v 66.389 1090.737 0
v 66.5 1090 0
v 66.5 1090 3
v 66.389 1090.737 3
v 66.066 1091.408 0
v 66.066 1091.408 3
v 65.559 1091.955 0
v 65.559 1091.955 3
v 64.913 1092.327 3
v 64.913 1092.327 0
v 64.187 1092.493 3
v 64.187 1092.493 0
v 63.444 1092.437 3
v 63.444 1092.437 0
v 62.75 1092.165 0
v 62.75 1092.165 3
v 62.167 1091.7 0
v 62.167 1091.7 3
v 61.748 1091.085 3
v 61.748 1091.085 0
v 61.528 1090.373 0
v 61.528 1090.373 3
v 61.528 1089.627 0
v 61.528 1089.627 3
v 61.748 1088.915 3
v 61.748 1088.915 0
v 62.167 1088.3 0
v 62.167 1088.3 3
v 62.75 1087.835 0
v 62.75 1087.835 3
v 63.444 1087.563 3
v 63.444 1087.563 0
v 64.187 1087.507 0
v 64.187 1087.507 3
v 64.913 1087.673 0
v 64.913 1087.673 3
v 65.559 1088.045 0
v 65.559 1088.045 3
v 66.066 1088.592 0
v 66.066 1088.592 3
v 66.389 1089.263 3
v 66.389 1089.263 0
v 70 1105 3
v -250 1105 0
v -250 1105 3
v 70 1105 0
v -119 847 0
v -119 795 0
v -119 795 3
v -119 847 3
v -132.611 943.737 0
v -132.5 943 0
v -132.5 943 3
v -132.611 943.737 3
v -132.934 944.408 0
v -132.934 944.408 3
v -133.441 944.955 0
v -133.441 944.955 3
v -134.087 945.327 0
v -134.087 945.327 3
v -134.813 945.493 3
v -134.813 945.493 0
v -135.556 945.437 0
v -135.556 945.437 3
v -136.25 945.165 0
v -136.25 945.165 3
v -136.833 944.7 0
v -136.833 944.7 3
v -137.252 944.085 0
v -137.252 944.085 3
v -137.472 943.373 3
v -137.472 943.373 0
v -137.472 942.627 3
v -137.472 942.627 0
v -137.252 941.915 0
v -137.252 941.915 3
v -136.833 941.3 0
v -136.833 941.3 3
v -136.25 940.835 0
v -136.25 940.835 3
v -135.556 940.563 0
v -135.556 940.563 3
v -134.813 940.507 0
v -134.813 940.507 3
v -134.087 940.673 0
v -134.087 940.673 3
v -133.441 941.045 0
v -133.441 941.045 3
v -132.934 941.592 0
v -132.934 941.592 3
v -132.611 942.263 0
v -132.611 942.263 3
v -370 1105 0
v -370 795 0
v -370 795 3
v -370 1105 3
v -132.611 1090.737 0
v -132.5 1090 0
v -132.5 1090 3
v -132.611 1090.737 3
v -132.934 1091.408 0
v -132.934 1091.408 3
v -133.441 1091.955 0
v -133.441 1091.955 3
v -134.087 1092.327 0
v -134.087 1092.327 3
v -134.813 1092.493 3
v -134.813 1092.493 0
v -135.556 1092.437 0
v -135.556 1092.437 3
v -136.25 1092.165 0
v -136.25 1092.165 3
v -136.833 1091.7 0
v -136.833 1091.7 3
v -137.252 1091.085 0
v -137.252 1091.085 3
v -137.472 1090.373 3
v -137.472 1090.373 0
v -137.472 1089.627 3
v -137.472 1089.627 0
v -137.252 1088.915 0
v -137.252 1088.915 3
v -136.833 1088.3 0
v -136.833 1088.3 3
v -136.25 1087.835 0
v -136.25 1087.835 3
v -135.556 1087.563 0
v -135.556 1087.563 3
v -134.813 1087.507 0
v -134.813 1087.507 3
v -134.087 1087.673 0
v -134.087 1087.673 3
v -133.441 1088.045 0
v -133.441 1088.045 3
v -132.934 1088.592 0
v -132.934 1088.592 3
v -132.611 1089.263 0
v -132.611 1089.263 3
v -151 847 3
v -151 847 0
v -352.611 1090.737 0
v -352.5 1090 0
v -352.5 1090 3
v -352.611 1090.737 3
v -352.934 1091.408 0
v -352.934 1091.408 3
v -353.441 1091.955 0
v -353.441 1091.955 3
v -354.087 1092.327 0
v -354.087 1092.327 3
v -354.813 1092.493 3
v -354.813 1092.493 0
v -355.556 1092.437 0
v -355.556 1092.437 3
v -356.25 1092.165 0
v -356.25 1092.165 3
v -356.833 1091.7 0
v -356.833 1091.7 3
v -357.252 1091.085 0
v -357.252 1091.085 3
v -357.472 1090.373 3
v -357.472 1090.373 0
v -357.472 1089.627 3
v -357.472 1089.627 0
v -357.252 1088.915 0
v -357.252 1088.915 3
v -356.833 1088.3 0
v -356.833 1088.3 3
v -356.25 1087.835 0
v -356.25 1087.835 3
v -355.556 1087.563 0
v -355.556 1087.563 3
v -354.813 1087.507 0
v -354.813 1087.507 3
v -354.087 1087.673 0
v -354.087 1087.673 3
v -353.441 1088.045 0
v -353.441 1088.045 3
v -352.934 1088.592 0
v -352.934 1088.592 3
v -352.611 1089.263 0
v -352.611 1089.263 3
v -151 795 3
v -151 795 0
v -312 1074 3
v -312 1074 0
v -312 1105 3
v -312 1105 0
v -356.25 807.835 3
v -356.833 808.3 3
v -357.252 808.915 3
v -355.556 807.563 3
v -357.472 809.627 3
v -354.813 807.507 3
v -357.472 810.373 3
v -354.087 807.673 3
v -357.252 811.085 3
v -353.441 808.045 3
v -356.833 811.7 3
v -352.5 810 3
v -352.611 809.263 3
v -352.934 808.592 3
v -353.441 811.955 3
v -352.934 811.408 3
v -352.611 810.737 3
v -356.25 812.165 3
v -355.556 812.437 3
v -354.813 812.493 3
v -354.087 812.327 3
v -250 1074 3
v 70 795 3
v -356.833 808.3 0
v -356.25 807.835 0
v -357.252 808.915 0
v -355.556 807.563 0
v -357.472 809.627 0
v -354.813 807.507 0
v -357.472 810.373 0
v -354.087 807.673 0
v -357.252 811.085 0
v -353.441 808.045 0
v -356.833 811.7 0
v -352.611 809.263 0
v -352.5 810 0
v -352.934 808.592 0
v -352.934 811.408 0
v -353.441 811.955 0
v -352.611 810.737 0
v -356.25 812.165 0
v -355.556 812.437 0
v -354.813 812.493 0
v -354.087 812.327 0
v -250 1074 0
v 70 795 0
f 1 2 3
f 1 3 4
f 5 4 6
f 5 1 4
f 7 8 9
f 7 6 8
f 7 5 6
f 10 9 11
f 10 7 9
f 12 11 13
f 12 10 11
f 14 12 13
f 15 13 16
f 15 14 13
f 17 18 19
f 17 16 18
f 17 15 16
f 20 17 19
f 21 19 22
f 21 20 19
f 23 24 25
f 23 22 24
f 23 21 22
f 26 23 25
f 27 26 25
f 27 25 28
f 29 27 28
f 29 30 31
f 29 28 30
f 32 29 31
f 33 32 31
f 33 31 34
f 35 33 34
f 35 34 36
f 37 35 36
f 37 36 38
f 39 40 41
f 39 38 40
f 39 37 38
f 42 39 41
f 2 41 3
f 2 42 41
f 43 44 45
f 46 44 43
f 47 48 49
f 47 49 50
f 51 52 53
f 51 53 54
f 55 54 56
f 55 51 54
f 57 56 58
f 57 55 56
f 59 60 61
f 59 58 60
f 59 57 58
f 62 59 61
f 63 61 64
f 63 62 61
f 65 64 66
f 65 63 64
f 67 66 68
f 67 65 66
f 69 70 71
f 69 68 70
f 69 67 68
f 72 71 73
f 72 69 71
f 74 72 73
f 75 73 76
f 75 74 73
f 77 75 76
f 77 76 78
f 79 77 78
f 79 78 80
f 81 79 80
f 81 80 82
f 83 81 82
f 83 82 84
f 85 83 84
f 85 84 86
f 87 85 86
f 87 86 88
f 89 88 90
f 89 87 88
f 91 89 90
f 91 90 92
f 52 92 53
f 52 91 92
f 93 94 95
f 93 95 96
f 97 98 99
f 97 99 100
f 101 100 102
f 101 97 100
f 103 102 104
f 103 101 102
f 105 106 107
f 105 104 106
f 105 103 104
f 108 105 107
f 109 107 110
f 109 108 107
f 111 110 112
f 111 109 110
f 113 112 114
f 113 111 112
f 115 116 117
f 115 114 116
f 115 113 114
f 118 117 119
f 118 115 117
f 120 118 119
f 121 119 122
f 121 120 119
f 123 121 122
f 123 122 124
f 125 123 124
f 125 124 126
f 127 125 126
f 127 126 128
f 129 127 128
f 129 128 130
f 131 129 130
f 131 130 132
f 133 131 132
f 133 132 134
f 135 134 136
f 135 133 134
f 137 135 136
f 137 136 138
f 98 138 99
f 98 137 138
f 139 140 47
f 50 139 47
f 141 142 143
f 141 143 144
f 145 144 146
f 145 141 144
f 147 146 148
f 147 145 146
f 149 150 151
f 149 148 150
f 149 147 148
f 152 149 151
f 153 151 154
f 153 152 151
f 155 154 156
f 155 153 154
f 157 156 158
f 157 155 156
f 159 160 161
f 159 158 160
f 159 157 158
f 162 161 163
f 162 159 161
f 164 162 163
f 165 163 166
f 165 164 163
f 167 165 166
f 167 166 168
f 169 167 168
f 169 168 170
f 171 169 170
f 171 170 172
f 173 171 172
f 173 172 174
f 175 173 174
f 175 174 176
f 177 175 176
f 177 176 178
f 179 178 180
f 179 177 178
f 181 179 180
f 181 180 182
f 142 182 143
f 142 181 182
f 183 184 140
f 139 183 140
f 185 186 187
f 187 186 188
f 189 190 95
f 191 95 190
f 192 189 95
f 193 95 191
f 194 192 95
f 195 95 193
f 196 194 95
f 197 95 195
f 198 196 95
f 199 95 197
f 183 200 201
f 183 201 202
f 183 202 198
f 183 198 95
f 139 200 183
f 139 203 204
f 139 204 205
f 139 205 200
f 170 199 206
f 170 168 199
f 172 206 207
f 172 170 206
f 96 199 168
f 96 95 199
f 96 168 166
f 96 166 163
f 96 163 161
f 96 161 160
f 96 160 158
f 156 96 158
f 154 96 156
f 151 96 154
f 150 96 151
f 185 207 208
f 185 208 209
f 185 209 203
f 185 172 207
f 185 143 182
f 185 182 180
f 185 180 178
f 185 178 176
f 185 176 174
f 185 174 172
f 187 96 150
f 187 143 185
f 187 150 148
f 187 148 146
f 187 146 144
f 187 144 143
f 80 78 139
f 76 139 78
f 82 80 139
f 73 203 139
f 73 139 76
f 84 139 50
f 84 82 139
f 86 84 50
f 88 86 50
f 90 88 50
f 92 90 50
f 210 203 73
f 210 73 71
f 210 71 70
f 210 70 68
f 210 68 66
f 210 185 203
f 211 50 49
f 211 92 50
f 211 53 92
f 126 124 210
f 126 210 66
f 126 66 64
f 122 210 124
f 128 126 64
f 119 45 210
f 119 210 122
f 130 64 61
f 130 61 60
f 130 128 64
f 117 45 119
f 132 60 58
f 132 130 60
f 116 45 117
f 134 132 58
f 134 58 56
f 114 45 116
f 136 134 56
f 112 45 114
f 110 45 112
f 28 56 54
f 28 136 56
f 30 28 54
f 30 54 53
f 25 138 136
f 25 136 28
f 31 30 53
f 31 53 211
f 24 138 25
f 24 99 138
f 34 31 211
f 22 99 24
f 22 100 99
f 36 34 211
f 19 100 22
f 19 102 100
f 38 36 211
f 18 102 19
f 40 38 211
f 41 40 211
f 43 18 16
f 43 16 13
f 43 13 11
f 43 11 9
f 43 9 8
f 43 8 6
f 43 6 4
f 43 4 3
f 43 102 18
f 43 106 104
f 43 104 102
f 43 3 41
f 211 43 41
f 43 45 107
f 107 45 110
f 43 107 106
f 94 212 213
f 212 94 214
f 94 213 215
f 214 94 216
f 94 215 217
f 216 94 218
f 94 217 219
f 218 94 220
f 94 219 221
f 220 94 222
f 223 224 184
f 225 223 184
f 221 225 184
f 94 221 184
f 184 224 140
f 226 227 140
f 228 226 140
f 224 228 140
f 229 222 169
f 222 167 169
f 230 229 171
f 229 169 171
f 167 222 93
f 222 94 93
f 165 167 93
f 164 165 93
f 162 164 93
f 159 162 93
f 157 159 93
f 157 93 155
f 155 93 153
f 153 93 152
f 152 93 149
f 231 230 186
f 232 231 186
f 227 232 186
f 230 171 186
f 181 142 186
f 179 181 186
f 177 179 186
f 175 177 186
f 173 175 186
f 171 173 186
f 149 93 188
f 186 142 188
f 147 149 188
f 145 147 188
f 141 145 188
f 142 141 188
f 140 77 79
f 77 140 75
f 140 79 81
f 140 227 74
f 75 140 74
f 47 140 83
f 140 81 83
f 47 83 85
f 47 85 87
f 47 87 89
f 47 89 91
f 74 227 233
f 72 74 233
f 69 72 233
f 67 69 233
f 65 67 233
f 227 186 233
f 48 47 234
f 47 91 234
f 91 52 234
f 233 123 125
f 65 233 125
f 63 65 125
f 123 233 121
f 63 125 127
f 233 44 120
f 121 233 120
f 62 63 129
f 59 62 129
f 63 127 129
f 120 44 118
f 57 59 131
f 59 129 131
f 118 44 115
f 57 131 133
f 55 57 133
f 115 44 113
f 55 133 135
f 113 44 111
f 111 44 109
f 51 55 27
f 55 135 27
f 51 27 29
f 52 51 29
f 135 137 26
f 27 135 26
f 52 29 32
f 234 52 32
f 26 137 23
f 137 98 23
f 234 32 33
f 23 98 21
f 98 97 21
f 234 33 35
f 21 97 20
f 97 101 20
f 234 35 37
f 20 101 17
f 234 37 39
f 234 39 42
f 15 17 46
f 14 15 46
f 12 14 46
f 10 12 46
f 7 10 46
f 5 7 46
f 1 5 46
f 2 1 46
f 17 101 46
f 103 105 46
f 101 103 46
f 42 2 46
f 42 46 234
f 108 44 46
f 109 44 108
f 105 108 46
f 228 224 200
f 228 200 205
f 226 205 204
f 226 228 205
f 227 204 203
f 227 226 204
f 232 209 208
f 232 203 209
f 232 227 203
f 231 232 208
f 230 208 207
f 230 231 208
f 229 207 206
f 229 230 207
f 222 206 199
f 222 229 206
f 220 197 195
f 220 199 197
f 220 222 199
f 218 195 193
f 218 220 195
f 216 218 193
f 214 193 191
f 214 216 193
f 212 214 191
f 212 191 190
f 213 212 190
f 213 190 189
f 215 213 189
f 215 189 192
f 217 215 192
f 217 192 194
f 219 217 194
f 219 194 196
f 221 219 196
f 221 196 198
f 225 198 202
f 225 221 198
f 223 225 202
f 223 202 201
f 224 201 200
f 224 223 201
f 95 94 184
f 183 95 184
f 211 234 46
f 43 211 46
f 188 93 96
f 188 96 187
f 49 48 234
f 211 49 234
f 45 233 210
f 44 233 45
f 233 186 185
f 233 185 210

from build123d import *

# Parameters (mm, degrees)
BOX002_W          = 32
BOX002_H          = 62
BOX002_DEPTH      = 9
CYLINDER_R        = 2.5
CYLINDER_DEPTH    = 10
CYLINDER001_R     = 2.5
CYLINDER001_DEPTH = 100
CYLINDER002_R     = 2.5
CYLINDER002_DEPTH = 100
CYLINDER003_R     = 2.5
CYLINDER003_DEPTH = 100
CYLINDER004_R     = 2.5
CYLINDER004_DEPTH = 100
BOX001_W          = 62
BOX001_H          = 32
BOX001_DEPTH      = 9
BOX_W             = 440
BOX_H             = 310
BOX_DEPTH         = 3


with BuildPart() as electronics_base002:
    # Box002 → Box002 (new body)
    with BuildSketch(Plane(origin=(-151, 785, -1), x_dir=(1, 0, 0), z_dir=(0, 0, 1))):
        with Locations((16, 31)):
            Rectangle(BOX002_W, BOX002_H)
    extrude(amount=BOX002_DEPTH)


with BuildPart() as cylinder:
    # Cylinder → Cylinder (new body)
    with BuildSketch(Plane(origin=(64, 1090, -3), x_dir=(1, 0, 0), z_dir=(0, 0, 1))):
        Circle(CYLINDER_R)
    extrude(amount=CYLINDER_DEPTH)


with BuildPart() as cylinder001:
    # Cylinder001 → Cylinder001 (new body)
    with BuildSketch(Plane(origin=(-135, 1090, -45), x_dir=(1, 0, 0), z_dir=(0, 0, 1))):
        Circle(CYLINDER001_R)
    extrude(amount=CYLINDER001_DEPTH)


with BuildPart() as cylinder002:
    # Cylinder002 → Cylinder002 (new body)
    with BuildSketch(Plane(origin=(-355, 1090, -45), x_dir=(1, 0, 0), z_dir=(0, 0, 1))):
        Circle(CYLINDER002_R)
    extrude(amount=CYLINDER002_DEPTH)


with BuildPart() as cylinder003:
    # Cylinder003 → Cylinder003 (new body)
    with BuildSketch(Plane(origin=(-355, 810, -45), x_dir=(1, 0, 0), z_dir=(0, 0, 1))):
        Circle(CYLINDER003_R)
    extrude(amount=CYLINDER003_DEPTH)


with BuildPart() as cylinder004:
    # Cylinder004 → Cylinder004 (new body)
    with BuildSketch(Plane(origin=(-135, 943, -45), x_dir=(1, 0, 0), z_dir=(0, 0, 1))):
        Circle(CYLINDER004_R)
    extrude(amount=CYLINDER004_DEPTH)


with BuildPart() as cuts_electronic_base:
    # Box001 → Box001 (new body)
    with BuildSketch(Plane(origin=(-312, 1074, -1), x_dir=(1, 0, 0), z_dir=(0, 0, 1))):
        with Locations((31, 16)):
            Rectangle(BOX001_W, BOX001_H)
    extrude(amount=BOX001_DEPTH)

    # Fusion001002: union electronics_base002, Cylinder, Cylinder001, Cylinder002, Cylinder003, Cylinder004
    add(electronics_base002.part)
    add(cylinder.part)
    add(cylinder001.part)
    add(cylinder002.part)
    add(cylinder003.part)
    add(cylinder004.part)


with BuildPart() as wood_electronic_base:
    # Box → Box (new body)
    with BuildSketch(Plane(origin=(-370, 795, 0), x_dir=(1, 0, 0), z_dir=(0, 0, 1))):
        with Locations((220, 155)):
            Rectangle(BOX_W, BOX_H)
    extrude(amount=BOX_DEPTH)

    # Cut: cut cuts_electronic_base
    add(cuts_electronic_base.part, mode=Mode.SUBTRACT)


solid = wood_electronic_base.part
